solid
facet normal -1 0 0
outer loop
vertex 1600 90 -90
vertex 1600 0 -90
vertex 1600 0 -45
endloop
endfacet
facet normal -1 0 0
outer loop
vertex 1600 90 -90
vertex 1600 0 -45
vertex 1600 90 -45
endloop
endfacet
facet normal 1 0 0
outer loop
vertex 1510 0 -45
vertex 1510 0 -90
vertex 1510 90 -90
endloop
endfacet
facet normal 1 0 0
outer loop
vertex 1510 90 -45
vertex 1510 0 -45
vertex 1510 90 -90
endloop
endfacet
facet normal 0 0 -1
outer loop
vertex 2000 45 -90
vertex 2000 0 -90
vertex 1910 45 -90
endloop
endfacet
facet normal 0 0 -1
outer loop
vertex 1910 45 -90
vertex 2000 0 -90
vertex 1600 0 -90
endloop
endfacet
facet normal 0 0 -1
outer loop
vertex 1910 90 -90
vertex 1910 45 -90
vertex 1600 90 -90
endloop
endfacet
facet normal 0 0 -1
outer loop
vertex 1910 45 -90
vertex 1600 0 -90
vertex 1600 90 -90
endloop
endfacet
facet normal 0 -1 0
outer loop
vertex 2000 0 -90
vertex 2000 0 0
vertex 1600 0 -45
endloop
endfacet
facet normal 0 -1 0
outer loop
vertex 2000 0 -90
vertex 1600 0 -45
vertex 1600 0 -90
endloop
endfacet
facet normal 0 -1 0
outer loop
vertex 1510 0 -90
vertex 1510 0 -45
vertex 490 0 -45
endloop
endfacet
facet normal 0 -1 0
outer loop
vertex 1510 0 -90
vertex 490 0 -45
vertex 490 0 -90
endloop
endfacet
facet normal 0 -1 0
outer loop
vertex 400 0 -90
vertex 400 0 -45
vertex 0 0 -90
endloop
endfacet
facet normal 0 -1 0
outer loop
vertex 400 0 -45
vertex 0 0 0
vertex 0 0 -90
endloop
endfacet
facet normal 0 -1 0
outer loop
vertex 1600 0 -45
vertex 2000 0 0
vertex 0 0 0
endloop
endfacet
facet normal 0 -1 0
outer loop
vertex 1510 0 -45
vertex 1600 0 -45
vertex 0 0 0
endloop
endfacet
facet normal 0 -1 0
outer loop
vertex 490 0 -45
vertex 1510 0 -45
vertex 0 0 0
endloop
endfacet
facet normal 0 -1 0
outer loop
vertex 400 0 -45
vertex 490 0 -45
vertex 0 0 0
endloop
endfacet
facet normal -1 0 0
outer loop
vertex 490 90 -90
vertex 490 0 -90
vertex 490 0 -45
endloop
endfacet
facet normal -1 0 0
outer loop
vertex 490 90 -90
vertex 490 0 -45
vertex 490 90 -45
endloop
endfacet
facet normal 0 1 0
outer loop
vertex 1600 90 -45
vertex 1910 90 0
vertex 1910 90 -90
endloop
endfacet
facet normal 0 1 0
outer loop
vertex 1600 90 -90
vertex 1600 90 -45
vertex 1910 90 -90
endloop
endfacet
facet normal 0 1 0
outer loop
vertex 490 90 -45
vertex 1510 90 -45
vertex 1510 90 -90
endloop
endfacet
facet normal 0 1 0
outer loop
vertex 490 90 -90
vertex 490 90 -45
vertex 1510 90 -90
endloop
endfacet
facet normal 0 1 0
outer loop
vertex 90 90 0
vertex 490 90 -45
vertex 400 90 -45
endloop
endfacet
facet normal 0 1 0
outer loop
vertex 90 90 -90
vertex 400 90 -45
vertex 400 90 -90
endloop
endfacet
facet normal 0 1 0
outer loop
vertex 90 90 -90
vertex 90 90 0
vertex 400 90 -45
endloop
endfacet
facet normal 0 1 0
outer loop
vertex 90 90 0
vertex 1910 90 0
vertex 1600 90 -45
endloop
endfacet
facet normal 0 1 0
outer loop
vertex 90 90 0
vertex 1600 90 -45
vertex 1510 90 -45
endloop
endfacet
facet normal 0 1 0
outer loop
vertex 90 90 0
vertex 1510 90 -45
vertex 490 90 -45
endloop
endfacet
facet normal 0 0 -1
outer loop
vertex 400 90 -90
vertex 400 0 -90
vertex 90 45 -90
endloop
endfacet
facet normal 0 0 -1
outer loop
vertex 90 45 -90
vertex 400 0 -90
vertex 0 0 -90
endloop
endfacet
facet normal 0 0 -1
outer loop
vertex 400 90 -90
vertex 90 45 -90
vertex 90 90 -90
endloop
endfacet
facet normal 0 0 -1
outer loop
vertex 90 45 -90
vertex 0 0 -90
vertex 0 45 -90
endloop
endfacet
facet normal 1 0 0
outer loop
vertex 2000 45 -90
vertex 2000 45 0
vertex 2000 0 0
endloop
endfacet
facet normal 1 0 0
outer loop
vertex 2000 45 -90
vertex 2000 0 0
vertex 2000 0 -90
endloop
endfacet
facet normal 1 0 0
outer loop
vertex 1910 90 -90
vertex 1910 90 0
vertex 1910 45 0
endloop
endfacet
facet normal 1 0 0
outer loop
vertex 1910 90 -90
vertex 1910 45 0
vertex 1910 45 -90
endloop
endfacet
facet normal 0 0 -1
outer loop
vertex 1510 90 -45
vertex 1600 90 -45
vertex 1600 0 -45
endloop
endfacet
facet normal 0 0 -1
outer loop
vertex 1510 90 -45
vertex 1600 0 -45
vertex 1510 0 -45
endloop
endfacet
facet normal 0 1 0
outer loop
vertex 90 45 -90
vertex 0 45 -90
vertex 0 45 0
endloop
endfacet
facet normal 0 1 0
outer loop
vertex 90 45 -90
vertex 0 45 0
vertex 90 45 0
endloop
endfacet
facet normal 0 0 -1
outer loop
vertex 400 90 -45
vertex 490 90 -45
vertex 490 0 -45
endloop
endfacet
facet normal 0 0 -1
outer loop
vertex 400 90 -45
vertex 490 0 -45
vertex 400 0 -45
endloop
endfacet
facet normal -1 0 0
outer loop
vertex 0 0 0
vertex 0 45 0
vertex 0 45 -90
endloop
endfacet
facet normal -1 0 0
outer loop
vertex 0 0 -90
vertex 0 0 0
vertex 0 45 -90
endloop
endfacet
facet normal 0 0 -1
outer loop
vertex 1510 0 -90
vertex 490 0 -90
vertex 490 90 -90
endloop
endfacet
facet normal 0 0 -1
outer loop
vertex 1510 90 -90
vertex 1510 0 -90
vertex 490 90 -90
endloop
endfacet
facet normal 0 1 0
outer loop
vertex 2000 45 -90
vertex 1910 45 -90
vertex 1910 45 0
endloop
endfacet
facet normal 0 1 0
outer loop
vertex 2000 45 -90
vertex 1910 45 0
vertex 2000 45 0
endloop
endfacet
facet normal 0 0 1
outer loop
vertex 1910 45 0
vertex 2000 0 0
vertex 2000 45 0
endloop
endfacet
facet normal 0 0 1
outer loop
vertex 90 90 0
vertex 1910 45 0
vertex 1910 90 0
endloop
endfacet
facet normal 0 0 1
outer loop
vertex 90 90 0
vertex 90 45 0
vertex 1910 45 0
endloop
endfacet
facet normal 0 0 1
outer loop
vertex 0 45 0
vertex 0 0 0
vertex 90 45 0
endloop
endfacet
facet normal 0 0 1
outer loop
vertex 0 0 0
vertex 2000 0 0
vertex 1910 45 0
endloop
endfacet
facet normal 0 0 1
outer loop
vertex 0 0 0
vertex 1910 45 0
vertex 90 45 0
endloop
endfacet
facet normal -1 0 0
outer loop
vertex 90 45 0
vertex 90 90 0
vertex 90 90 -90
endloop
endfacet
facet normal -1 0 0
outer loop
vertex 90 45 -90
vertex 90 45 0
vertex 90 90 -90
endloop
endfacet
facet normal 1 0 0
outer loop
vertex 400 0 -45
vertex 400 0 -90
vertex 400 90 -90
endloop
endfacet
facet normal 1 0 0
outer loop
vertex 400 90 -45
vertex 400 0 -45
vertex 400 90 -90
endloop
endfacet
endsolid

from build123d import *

# Parameters (mm, degrees)
SKETCH1_W           = 90
SKETCH1_H           = 90
BOSS_EXTRUDE1_DEPTH = 2000
SKETCH2_W           = 90
SKETCH2_H           = 90
CUT_EXTRUDE1_DEPTH  = 45
SKETCH3_W           = 90
SKETCH3_H           = 90
CUT_EXTRUDE2_DEPTH  = 45


with BuildPart() as part:
    # Sketch1 → Boss-Extrude1 (new body)
    with BuildSketch(Plane(origin=(0, 0, 0), x_dir=(0, 0, -1), z_dir=(1, 0, 0))):
        with Locations((45, 45)):
            Rectangle(SKETCH1_W, SKETCH1_H)
    extrude(amount=BOSS_EXTRUDE1_DEPTH)

    # Sketch2 → Cut-Extrude1 (cut)
    with BuildSketch(Plane(origin=(0, 90, 0), x_dir=(1, 0, 0), z_dir=(0, 1, 0))):
        with Locations((45, 45)):
            Rectangle(SKETCH2_W, SKETCH2_H)
        with Locations((1955, 45)):
            Rectangle(SKETCH2_W, SKETCH2_H)
    extrude(amount=-CUT_EXTRUDE1_DEPTH, mode=Mode.SUBTRACT)

    # Sketch3 → Cut-Extrude2 (cut)
    with BuildSketch(Plane(origin=(0, 0, -90), x_dir=(-1, 0, 0), z_dir=(0, 0, -1))):
        with Locations((-1555, 45)):
            Rectangle(SKETCH3_W, SKETCH3_H)
        with Locations((-445, 45)):
            Rectangle(SKETCH3_W, SKETCH3_H)
    extrude(amount=-CUT_EXTRUDE2_DEPTH, mode=Mode.SUBTRACT)


solid = part.part
